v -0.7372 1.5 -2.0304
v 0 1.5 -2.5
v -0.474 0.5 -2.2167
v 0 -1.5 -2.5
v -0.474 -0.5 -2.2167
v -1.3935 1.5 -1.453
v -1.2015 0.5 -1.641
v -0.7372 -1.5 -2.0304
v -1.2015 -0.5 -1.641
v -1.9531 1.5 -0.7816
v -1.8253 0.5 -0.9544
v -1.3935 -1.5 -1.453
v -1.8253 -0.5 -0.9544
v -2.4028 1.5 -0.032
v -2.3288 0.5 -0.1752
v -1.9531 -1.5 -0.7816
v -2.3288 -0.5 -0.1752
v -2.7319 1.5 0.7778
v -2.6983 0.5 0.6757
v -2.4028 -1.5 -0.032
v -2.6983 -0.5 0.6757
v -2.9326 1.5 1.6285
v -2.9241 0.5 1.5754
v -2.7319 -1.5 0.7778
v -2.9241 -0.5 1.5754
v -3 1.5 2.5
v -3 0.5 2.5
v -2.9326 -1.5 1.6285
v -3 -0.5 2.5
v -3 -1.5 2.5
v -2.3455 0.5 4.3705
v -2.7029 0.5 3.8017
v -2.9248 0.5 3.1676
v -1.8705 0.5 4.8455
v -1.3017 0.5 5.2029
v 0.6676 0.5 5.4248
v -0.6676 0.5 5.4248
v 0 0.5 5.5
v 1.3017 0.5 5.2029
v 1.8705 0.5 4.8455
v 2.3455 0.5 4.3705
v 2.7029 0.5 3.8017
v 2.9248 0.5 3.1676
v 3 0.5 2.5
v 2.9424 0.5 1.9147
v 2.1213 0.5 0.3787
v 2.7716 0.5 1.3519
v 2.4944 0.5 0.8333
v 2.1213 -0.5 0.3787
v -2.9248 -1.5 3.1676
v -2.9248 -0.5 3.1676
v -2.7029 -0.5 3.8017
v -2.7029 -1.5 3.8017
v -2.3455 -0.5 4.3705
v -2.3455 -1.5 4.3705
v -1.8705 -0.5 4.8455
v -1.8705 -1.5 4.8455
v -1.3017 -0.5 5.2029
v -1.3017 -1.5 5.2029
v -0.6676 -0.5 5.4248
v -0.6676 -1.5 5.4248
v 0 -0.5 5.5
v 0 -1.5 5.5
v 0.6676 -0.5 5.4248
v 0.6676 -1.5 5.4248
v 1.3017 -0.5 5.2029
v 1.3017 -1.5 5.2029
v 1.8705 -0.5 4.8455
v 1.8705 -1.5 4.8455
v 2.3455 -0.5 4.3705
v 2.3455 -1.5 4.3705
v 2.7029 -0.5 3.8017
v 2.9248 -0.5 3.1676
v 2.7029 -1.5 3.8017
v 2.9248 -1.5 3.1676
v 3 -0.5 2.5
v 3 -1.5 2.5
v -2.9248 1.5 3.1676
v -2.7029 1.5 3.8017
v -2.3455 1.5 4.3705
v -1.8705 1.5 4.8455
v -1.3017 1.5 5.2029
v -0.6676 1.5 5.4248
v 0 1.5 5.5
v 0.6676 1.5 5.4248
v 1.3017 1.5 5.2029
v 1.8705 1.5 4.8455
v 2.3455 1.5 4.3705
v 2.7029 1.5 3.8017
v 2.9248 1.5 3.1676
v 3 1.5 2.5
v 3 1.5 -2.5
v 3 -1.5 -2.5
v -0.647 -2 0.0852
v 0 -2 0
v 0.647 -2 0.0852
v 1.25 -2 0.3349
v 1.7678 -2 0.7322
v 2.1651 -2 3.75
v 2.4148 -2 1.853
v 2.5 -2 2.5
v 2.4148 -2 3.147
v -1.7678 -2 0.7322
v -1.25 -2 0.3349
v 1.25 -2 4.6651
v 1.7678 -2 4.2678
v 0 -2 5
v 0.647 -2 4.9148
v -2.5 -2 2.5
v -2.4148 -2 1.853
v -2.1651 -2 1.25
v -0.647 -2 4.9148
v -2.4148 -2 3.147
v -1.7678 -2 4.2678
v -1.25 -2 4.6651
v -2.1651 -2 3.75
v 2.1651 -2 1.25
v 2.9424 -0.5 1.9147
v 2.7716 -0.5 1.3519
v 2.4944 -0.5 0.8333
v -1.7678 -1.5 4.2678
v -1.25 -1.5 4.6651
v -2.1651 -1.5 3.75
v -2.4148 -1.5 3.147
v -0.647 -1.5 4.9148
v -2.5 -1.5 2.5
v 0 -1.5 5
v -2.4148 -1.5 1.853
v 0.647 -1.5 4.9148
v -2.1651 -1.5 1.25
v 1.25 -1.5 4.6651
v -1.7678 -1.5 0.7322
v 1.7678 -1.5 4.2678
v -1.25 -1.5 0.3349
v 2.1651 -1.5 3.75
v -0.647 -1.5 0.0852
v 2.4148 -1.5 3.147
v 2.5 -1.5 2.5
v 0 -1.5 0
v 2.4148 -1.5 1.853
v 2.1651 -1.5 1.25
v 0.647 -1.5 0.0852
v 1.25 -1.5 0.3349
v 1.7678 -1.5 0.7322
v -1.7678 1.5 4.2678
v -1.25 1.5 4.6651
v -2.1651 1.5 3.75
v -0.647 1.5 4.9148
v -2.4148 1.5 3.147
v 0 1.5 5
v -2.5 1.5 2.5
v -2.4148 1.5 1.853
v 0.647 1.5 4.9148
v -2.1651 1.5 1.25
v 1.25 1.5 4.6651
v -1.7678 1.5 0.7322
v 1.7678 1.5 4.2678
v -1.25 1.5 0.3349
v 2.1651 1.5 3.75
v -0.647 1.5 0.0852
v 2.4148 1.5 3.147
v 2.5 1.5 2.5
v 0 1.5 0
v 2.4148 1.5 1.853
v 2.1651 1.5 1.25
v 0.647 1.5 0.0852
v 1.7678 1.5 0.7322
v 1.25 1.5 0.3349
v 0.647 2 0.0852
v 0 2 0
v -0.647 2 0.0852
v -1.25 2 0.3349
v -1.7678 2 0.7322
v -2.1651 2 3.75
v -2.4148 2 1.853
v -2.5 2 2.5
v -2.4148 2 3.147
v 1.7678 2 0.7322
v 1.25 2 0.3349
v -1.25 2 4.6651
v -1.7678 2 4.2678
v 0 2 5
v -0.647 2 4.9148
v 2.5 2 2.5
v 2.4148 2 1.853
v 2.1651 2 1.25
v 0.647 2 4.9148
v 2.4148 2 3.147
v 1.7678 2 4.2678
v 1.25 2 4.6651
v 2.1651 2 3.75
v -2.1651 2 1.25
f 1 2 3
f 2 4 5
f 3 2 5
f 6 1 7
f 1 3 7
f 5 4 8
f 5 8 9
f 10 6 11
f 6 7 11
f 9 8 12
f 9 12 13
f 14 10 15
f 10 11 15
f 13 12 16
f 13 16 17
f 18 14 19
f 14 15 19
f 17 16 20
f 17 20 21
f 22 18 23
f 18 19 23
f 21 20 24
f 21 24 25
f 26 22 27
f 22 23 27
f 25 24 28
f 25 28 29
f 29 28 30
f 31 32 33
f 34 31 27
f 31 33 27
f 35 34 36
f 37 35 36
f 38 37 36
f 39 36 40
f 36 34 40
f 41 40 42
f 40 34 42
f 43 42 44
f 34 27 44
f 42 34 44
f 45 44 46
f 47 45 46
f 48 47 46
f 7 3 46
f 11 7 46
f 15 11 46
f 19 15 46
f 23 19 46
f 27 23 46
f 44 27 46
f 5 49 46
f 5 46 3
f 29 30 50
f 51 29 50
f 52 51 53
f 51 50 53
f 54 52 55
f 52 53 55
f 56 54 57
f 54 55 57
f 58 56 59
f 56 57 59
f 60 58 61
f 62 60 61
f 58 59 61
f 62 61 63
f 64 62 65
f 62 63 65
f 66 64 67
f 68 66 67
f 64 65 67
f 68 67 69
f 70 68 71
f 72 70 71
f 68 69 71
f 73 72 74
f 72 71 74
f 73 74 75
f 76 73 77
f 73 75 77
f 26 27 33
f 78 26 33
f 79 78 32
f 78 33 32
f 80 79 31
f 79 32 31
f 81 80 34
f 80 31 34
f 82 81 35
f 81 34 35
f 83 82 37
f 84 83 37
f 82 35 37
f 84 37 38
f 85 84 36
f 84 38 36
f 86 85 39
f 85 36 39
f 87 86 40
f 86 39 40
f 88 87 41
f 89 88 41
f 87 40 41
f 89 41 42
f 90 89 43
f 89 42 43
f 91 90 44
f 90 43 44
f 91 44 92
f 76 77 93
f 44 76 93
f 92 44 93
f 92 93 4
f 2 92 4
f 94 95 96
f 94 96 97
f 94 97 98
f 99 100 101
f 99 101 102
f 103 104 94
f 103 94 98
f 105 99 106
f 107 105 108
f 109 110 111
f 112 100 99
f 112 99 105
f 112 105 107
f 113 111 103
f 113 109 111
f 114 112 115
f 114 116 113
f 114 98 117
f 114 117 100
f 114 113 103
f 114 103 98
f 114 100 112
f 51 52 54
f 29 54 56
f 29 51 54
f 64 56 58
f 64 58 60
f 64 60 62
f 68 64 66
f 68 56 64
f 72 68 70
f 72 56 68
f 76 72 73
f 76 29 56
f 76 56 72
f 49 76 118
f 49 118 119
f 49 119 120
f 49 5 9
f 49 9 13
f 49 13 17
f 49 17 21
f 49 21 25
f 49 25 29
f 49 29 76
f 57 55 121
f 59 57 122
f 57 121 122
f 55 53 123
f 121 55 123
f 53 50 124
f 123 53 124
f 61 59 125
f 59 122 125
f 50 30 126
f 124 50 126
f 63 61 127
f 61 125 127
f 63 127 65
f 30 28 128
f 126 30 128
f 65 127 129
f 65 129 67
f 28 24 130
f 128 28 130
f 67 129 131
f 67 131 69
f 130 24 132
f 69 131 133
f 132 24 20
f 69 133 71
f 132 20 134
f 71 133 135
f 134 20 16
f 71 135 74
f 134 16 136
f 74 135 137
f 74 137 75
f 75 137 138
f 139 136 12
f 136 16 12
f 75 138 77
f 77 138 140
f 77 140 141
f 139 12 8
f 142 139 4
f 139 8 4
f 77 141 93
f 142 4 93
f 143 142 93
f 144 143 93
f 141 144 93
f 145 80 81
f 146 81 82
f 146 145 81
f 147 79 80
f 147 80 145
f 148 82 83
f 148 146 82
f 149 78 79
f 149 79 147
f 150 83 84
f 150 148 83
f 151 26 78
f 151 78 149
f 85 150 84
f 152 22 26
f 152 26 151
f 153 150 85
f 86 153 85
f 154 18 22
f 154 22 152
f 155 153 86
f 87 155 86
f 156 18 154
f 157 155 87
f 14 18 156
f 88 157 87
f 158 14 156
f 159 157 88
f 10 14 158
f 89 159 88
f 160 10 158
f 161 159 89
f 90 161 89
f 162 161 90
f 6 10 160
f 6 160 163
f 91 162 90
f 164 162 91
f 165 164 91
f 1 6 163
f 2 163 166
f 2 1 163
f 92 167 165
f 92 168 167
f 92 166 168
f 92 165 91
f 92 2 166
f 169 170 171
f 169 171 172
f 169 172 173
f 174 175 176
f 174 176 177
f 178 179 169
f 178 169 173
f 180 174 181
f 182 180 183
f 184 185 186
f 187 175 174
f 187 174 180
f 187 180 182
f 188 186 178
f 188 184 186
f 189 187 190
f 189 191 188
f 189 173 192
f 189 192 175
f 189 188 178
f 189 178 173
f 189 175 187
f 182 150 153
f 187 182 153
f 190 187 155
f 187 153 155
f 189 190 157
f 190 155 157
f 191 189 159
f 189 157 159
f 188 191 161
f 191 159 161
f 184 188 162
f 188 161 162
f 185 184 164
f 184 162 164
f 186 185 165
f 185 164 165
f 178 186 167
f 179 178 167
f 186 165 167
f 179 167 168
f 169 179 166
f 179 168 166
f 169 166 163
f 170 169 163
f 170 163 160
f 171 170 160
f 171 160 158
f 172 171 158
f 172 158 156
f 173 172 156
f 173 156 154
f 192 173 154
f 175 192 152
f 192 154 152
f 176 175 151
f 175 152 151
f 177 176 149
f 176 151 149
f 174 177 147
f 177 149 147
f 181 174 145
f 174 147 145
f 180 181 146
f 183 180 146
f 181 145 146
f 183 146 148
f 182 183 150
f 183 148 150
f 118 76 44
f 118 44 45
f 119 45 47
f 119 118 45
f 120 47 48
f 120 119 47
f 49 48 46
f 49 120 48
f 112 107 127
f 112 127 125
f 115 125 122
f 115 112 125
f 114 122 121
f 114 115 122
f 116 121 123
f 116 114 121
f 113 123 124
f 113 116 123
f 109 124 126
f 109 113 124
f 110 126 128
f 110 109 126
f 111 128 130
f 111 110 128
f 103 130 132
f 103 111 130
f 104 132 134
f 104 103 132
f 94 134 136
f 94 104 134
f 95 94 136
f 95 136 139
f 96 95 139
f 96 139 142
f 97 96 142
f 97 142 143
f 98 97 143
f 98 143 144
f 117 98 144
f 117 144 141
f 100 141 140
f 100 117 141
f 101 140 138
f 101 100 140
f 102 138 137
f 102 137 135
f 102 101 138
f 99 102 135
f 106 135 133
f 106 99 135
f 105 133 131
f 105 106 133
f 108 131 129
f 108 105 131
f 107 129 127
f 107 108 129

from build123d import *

# Parameters (mm, degrees)
BOSS_EXTRUDE1_DEPTH      = 1.5
BOSS_EXTRUDE1_DEPTH_BACK = 1.5
CUT_EXTRUDE1_DEPTH       = 0.5
CUT_EXTRUDE1_DEPTH_BACK  = 0.5
SKETCH3_R                = 2.5
BOSS_EXTRUDE2_DEPTH      = 0.5
BOSS_EXTRUDE3_START      = 0.5
SKETCH4_R                = 2.5
BOSS_EXTRUDE3_DEPTH      = 0.5


with BuildPart() as part:
    # Sketch1 → Boss-Extrude1 (new, two sides: drawn at the far end of the back side and taken through both)
    with BuildSketch(Plane(origin=(0, 0, 0), x_dir=(1, 0, 0), z_dir=(0, 1, 0)).offset(-BOSS_EXTRUDE1_DEPTH_BACK)):
        with BuildLine():
            ThreePointArc((0, 2.5), (-2.192459912, 0.415475947), (-3, -2.5))
            ThreePointArc((-3, -2.5), (0, -5.5), (3, -2.5))
            Line((3, -2.5), (3, 2.5))
            Line((3, 2.5), (0, 2.5))
        make_face()
    extrude(amount=BOSS_EXTRUDE1_DEPTH + BOSS_EXTRUDE1_DEPTH_BACK)

    # Sketch2 → Cut-Extrude1 (cut, two sides: drawn at the far end of the back side and taken through both)
    with BuildSketch(Plane(origin=(0, 0, 0), x_dir=(1, 0, 0), z_dir=(0, 1, 0)).offset(-CUT_EXTRUDE1_DEPTH_BACK)):
        with BuildLine():
            Line((-3, 4.742640687), (-3, -2.5))
            ThreePointArc((-3, -2.5), (1.148050297, -5.271638598), (2.121320344, -0.378679656))
            Line((2.121320344, -0.378679656), (-3, 4.742640687))
        make_face()
    extrude(amount=CUT_EXTRUDE1_DEPTH + CUT_EXTRUDE1_DEPTH_BACK, mode=Mode.SUBTRACT)

    # Sketch3 → Boss-Extrude2 (add)
    with BuildSketch(Plane(origin=(0, 1.5, 0), x_dir=(1, 0, 0), z_dir=(0, 1, 0))):
        with Locations((0, -2.5)):
            Circle(SKETCH3_R)
    extrude(amount=BOSS_EXTRUDE2_DEPTH)

    # Sketch4 → Boss-Extrude3 (add)
    with BuildSketch(Plane.XZ.offset(1.5).offset(BOSS_EXTRUDE3_START)):
        with Locations((0, 2.5)):
            Circle(SKETCH4_R)
    extrude(amount=-BOSS_EXTRUDE3_DEPTH)


solid = part.part
